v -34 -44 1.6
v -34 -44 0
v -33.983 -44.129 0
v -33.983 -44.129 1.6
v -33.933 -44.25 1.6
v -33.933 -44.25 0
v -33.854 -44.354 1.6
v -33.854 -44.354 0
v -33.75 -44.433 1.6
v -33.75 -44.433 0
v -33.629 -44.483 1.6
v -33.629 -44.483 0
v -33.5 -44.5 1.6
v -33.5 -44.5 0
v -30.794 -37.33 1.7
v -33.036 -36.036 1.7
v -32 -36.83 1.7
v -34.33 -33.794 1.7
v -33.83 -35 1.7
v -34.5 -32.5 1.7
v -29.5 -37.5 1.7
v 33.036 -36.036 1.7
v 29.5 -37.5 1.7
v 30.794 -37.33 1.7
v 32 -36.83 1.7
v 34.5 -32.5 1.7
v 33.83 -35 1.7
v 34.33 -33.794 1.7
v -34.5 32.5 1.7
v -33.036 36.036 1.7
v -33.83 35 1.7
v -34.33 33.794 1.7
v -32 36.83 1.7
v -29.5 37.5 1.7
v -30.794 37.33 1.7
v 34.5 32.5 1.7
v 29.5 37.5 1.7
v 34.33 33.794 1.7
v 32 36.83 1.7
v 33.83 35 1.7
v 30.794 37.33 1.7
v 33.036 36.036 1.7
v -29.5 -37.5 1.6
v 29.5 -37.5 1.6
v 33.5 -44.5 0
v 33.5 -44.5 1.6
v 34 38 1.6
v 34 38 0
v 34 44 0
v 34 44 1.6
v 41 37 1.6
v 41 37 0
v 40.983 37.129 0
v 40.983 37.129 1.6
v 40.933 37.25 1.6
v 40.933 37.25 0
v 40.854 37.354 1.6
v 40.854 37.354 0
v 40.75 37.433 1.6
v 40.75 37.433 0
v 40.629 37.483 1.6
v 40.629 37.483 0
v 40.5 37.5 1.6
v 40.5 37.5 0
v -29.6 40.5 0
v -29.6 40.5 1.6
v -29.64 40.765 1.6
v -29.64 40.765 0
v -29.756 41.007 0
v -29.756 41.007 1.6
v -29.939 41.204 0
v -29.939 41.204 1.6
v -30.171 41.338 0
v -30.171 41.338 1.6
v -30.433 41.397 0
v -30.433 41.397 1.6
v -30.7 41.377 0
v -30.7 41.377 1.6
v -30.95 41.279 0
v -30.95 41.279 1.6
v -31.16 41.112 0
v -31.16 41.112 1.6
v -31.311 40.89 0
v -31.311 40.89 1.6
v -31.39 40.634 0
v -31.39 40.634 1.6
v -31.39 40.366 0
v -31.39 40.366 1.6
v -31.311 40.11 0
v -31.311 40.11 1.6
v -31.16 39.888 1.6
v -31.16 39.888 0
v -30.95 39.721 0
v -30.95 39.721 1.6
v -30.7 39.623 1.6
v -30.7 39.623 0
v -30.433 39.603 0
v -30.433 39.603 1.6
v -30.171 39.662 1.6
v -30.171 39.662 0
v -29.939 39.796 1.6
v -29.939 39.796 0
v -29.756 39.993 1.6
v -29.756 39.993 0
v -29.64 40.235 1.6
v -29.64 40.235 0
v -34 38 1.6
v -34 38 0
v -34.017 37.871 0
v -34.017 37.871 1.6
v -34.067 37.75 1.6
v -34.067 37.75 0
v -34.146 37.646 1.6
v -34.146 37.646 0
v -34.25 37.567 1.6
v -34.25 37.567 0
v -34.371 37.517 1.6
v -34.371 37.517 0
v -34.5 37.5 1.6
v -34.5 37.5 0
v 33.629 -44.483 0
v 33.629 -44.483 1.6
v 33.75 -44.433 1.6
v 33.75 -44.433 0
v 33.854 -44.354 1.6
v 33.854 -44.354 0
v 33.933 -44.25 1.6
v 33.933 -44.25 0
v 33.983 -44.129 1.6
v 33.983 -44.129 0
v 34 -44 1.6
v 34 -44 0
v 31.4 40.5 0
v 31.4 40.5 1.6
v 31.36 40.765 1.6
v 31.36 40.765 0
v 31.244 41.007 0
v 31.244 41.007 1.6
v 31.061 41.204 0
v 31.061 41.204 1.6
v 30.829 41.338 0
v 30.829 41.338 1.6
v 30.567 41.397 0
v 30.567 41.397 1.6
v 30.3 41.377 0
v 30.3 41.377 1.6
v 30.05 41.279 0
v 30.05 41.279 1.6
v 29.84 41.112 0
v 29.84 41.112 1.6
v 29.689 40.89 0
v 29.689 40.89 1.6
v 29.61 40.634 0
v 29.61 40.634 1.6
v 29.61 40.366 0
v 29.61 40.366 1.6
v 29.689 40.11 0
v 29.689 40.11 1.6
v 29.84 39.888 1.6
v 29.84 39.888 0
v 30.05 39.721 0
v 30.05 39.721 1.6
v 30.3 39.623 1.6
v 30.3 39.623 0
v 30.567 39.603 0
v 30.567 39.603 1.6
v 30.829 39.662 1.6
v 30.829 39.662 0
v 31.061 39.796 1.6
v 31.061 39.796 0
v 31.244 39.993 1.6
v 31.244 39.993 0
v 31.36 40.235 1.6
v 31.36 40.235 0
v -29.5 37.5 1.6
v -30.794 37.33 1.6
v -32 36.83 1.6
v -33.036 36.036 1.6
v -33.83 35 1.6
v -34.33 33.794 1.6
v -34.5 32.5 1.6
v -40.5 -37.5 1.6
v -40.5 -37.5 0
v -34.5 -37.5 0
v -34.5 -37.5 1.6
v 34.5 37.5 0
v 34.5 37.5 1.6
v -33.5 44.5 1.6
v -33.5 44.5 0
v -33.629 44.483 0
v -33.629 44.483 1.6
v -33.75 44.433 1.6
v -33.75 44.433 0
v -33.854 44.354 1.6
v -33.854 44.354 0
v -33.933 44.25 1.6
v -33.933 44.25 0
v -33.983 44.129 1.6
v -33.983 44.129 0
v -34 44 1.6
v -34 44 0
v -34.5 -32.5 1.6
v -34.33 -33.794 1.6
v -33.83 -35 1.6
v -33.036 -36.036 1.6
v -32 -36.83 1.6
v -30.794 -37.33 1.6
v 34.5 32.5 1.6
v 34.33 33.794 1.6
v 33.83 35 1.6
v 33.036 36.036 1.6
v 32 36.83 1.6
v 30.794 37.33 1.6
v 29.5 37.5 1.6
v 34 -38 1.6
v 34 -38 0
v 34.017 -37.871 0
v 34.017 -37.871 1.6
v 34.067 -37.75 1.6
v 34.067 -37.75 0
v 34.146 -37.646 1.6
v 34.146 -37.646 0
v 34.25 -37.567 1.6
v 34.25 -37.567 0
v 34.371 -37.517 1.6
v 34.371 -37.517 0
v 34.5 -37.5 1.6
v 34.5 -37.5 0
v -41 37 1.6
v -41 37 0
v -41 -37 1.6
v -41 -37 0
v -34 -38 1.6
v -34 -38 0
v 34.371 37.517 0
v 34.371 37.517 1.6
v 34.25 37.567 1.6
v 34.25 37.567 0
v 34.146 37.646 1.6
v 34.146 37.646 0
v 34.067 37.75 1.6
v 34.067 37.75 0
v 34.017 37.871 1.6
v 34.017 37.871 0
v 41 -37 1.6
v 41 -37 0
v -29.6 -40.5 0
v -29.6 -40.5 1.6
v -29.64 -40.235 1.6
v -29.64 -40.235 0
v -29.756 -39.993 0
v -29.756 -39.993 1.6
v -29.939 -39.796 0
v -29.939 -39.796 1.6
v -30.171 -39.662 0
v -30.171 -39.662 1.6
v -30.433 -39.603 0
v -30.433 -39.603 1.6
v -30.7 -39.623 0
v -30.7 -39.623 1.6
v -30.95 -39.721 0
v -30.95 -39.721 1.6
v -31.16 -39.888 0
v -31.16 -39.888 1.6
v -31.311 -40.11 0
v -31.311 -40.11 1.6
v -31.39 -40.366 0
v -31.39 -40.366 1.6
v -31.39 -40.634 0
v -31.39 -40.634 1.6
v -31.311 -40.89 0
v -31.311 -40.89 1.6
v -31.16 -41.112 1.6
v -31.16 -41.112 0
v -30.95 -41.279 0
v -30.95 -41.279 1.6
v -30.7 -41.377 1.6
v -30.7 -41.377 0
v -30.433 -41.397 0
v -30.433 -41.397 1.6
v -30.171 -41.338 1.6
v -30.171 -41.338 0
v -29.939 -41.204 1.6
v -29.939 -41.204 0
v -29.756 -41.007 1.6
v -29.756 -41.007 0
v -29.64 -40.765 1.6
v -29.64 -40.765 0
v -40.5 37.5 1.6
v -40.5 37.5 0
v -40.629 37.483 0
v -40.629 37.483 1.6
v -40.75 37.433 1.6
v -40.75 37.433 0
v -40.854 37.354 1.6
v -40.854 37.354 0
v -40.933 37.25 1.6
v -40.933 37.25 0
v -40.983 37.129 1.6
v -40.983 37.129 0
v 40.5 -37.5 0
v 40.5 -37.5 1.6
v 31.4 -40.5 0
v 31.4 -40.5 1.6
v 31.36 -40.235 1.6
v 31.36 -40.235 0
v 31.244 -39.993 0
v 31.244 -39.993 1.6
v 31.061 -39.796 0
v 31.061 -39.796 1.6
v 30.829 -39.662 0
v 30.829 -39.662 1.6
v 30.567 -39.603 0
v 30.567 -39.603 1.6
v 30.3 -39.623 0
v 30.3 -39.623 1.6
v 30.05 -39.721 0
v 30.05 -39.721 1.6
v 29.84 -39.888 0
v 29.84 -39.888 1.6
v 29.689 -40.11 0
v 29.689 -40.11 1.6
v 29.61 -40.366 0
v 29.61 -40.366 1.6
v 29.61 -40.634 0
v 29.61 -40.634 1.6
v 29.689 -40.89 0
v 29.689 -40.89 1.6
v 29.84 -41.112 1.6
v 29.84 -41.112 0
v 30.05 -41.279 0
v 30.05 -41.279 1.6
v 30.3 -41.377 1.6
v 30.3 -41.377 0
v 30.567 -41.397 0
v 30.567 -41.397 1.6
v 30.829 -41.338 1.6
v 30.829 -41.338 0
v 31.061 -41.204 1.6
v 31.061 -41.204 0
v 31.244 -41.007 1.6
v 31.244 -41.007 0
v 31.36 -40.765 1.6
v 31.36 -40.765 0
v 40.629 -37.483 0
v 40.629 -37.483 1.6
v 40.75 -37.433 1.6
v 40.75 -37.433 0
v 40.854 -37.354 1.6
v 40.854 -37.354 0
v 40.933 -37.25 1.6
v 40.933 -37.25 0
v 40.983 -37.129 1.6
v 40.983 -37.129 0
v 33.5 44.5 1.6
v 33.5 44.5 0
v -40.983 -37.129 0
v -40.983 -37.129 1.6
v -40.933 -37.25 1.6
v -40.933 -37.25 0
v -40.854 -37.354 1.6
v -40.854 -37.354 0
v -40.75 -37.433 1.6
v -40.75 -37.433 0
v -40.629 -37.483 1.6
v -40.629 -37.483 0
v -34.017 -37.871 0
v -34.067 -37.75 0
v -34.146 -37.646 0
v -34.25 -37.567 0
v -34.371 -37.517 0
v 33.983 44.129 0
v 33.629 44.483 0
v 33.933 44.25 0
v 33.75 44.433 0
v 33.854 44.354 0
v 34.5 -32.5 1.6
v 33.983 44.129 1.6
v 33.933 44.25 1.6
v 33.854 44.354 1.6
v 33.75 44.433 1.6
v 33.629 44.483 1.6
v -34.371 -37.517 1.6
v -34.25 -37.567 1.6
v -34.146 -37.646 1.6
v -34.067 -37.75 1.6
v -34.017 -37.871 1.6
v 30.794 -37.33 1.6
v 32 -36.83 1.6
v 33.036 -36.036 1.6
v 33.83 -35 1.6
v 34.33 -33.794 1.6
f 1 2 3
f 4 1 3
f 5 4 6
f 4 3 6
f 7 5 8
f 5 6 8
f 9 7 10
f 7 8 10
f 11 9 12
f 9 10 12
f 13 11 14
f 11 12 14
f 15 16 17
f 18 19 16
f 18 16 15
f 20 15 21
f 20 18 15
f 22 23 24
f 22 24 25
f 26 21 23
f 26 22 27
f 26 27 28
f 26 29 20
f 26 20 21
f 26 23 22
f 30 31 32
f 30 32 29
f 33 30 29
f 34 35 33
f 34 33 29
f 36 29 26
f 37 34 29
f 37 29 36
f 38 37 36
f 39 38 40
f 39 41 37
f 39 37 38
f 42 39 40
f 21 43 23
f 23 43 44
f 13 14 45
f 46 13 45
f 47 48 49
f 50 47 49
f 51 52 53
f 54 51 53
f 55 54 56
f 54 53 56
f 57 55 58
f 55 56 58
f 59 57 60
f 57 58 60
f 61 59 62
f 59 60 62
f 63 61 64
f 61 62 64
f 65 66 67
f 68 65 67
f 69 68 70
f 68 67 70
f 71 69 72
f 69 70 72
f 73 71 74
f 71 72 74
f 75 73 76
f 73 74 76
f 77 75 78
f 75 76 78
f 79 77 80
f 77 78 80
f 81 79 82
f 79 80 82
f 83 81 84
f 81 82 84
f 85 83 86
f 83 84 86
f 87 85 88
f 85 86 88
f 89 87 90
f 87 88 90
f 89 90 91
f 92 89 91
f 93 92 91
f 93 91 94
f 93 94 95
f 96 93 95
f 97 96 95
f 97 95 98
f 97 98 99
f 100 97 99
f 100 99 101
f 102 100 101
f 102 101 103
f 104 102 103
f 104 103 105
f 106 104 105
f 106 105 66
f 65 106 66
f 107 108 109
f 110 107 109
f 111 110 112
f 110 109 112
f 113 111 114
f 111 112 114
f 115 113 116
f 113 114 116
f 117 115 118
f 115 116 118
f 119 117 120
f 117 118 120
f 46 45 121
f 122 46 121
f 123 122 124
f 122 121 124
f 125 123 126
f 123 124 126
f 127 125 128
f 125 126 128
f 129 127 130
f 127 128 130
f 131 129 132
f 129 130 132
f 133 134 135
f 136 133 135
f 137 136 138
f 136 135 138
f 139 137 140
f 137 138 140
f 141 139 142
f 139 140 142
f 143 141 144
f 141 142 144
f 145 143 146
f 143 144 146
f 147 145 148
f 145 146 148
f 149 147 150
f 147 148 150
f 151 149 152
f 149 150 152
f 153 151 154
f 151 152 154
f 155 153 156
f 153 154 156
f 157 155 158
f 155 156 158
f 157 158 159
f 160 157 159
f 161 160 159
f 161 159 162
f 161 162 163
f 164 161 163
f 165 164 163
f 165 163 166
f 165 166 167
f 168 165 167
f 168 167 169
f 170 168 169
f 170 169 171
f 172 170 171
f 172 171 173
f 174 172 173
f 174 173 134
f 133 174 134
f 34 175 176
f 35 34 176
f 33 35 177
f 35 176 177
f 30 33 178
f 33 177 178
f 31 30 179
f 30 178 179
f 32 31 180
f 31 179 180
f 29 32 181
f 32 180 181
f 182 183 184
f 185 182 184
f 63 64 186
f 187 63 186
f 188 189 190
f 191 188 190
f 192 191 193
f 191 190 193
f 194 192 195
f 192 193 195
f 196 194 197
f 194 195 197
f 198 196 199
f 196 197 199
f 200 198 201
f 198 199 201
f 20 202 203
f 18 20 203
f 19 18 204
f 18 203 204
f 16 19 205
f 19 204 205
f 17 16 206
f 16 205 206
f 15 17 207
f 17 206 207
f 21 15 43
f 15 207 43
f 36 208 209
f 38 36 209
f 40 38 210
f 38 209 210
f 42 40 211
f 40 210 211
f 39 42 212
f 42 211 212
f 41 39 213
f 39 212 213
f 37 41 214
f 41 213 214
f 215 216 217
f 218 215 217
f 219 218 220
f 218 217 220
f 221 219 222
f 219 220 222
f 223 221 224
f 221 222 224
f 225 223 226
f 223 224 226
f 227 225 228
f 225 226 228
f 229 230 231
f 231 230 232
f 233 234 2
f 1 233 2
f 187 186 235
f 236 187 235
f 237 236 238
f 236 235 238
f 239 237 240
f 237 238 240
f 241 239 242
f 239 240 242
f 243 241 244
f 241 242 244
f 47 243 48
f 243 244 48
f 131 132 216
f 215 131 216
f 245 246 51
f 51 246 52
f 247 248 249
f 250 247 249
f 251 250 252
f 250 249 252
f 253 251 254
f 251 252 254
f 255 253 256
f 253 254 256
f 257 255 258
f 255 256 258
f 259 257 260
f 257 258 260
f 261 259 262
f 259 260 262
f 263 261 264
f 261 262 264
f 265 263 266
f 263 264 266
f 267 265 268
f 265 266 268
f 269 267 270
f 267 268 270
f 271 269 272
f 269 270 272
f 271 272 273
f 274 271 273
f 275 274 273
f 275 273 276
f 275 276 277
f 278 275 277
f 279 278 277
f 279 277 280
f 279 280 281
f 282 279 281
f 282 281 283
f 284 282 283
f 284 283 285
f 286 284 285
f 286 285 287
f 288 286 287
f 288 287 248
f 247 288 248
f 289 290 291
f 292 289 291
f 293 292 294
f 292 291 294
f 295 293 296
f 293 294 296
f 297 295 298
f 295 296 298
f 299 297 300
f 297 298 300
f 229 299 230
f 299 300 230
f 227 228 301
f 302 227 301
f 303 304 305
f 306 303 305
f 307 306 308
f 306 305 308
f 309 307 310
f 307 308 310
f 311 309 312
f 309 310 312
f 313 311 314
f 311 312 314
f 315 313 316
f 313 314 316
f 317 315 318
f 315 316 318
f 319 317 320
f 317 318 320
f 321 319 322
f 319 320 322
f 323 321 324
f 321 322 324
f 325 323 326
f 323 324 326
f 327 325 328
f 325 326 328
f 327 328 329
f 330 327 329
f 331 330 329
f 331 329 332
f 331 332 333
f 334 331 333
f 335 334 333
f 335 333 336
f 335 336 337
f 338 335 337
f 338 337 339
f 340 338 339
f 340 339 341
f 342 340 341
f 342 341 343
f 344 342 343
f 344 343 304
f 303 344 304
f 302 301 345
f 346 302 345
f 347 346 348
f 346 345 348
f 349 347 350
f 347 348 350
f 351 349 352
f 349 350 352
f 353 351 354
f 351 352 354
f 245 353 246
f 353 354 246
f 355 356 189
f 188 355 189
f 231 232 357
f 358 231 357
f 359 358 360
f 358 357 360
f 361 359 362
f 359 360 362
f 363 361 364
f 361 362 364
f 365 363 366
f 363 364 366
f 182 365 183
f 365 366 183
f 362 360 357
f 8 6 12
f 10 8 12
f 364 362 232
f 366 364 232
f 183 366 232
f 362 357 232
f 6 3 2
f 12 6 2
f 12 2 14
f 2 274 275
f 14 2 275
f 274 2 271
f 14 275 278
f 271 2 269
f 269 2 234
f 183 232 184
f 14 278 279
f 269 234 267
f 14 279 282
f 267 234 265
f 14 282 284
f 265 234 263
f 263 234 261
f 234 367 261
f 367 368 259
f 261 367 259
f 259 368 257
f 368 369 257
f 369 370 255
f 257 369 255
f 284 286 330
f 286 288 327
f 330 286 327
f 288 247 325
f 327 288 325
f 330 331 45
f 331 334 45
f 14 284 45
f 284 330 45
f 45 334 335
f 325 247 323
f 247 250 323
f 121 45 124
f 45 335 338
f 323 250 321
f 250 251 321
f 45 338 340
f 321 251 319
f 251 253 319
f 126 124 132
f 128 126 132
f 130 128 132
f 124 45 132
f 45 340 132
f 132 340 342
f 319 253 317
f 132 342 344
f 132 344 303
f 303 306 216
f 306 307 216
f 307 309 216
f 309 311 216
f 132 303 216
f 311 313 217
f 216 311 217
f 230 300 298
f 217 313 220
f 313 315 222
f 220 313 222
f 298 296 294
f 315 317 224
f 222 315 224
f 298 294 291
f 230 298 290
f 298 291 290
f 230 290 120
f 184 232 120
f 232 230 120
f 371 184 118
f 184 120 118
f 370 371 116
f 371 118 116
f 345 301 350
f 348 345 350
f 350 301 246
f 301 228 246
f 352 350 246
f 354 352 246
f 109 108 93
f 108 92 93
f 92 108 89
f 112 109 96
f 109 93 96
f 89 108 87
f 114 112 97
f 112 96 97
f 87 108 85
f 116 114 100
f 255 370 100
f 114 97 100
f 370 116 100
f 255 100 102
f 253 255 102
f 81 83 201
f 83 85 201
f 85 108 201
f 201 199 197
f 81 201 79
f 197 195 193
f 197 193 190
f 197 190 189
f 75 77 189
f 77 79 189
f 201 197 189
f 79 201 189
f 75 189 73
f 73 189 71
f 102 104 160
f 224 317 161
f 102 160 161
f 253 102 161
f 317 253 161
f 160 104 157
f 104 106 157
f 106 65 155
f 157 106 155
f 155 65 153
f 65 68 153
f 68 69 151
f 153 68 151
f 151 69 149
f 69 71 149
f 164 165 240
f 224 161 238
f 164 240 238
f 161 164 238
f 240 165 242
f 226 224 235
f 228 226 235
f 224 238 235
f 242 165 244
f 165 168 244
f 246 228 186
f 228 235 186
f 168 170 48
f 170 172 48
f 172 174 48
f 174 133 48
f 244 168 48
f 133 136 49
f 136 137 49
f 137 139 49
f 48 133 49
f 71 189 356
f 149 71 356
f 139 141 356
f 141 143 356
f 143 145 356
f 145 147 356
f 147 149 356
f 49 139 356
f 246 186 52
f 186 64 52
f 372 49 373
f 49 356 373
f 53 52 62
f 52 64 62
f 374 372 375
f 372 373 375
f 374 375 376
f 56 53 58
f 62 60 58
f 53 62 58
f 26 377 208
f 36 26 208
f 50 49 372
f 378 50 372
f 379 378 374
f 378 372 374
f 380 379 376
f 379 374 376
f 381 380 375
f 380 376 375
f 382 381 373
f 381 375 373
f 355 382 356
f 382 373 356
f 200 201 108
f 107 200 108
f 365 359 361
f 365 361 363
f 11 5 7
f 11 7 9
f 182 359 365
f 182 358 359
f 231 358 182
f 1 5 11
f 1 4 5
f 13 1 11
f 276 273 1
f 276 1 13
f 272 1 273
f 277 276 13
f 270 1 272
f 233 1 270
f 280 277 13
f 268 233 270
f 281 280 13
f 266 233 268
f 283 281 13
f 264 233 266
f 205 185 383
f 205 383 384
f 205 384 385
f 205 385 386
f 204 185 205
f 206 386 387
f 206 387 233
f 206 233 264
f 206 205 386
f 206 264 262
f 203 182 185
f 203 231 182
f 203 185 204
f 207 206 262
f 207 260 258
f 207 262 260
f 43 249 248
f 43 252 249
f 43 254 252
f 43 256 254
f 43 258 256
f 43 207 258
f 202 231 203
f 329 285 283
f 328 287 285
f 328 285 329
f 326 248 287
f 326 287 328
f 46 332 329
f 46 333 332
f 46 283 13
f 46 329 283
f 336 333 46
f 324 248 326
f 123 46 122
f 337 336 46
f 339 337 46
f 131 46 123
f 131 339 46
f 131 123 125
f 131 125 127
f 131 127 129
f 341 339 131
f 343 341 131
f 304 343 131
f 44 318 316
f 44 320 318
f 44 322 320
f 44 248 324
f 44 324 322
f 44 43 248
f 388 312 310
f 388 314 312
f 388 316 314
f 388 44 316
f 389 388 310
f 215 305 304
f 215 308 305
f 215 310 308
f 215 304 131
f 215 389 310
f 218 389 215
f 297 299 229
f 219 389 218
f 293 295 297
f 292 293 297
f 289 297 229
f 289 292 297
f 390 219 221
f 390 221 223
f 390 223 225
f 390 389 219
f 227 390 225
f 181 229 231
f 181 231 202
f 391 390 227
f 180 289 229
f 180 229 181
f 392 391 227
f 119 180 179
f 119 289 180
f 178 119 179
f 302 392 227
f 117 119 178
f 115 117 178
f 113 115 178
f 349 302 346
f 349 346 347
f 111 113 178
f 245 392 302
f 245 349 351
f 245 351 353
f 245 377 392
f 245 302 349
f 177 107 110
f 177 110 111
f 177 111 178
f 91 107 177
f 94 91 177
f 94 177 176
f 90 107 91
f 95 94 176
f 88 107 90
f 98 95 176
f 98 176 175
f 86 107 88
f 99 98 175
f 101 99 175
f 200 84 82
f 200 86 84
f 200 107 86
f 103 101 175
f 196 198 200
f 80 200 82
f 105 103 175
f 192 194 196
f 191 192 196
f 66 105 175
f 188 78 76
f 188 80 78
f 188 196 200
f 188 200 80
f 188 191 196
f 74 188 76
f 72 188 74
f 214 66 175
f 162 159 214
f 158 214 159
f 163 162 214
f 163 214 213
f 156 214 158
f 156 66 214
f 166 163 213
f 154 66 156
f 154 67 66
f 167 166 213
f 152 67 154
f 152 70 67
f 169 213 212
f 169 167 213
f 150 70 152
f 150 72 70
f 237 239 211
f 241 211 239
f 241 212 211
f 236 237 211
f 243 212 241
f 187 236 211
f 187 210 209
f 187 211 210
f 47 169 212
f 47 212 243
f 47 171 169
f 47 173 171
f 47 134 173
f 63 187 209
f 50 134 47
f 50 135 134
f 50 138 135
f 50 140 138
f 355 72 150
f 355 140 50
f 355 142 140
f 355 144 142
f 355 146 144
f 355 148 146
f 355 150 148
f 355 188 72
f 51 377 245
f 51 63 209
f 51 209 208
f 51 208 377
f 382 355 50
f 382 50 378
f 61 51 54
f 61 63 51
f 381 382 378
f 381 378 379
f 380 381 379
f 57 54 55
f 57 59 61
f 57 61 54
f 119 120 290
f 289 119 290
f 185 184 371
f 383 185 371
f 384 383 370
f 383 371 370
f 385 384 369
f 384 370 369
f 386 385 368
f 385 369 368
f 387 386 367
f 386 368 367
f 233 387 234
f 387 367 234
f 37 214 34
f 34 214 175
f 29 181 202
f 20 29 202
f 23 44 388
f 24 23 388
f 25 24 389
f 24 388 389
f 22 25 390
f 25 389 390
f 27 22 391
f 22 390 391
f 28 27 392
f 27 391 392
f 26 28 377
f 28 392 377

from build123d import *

# Parameters (mm, degrees)
BOSS_EXTRUDE1_DEPTH              = 1.6
BOSS_EXTRUDE2_DEPTH              = 0.1
M1_6_HOLE1_FIXINGSTRUCTURE_D     = 1.8
M1_6_HOLE1_FIXINGSTRUCTURE_DEPTH = 200
M1_6_HOLE1_FIXINGSTRUCTURE_TIP   = 0.540774557


with BuildPart() as part:
    # Sketch1 → Boss-Extrude1 (new body)
    with BuildSketch(Plane.XY):
        with BuildLine():
            Line((-34, 44), (-34, 38))
            ThreePointArc((-34, 38), (-34.146446609, 37.646446609), (-34.5, 37.5))
            Line((-34.5, 37.5), (-40.5, 37.5))
            ThreePointArc((-40.5, 37.5), (-40.853553391, 37.353553391), (-41, 37))
            Line((-41, 37), (-41, -37))
            ThreePointArc((-41, -37), (-40.853553391, -37.353553391), (-40.5, -37.5))
            Line((-40.5, -37.5), (-34.5, -37.5))
            ThreePointArc((-34.5, -37.5), (-34.146446609, -37.646446609), (-34, -38))
            Line((-34, -38), (-34, -44))
            ThreePointArc((-34, -44), (-33.853553391, -44.353553391), (-33.5, -44.5))
            Line((-33.5, -44.5), (33.5, -44.5))
            ThreePointArc((33.5, -44.5), (33.853553391, -44.353553391), (34, -44))
            Line((34, -44), (34, -38))
            ThreePointArc((34, -38), (34.146446609, -37.646446609), (34.5, -37.5))
            Line((34.5, -37.5), (40.5, -37.5))
            ThreePointArc((40.5, -37.5), (40.853553391, -37.353553391), (41, -37))
            Line((41, -37), (41, 37))
            ThreePointArc((41, 37), (40.853553391, 37.353553391), (40.5, 37.5))
            Line((40.5, 37.5), (34.5, 37.5))
            ThreePointArc((34.5, 37.5), (34.146446609, 37.646446609), (34, 38))
            Line((34, 38), (34, 44))
            ThreePointArc((34, 44), (33.853553391, 44.353553391), (33.5, 44.5))
            Line((33.5, 44.5), (-33.5, 44.5))
            ThreePointArc((-33.5, 44.5), (-33.853553391, 44.353553391), (-34, 44))
        make_face()
    extrude(amount=BOSS_EXTRUDE1_DEPTH)

    # Esboço1 → Boss-Extrude2 (add)
    with BuildSketch(Plane.XY.offset(1.6)):
        with BuildLine():
            Line((-29.5, -37.5), (29.5, -37.5))
            ThreePointArc((29.5, -37.5), (33.035533906, -36.035533906), (34.5, -32.5))
            Line((34.5, -32.5), (34.5, 32.5))
            ThreePointArc((34.5, 32.5), (33.035533906, 36.035533906), (29.5, 37.5))
            Line((29.5, 37.5), (-29.5, 37.5))
            ThreePointArc((-29.5, 37.5), (-33.035533906, 36.035533906), (-34.5, 32.5))
            Line((-34.5, 32.5), (-34.5, -32.5))
            ThreePointArc((-34.5, -32.5), (-33.035533906, -36.035533906), (-29.5, -37.5))
        make_face()
    extrude(amount=BOSS_EXTRUDE2_DEPTH)

    # M1.6 Hole1-FixingStructure
    with Locations(Plane(origin=(0, 0, 0), x_dir=(-1, 0, 0), z_dir=(0, 0, -1))):
        with Locations((-30.5, 40.5), (30.5, 40.5), (-30.5, -40.5), (30.5, -40.5)):
            Hole(M1_6_HOLE1_FIXINGSTRUCTURE_D / 2, depth=M1_6_HOLE1_FIXINGSTRUCTURE_DEPTH)
            with Locations((0, 0, -(M1_6_HOLE1_FIXINGSTRUCTURE_DEPTH + M1_6_HOLE1_FIXINGSTRUCTURE_TIP / 2))):  # 118° drill point
                Cone(0, M1_6_HOLE1_FIXINGSTRUCTURE_D / 2, M1_6_HOLE1_FIXINGSTRUCTURE_TIP, mode=Mode.SUBTRACT)


solid = part.part
